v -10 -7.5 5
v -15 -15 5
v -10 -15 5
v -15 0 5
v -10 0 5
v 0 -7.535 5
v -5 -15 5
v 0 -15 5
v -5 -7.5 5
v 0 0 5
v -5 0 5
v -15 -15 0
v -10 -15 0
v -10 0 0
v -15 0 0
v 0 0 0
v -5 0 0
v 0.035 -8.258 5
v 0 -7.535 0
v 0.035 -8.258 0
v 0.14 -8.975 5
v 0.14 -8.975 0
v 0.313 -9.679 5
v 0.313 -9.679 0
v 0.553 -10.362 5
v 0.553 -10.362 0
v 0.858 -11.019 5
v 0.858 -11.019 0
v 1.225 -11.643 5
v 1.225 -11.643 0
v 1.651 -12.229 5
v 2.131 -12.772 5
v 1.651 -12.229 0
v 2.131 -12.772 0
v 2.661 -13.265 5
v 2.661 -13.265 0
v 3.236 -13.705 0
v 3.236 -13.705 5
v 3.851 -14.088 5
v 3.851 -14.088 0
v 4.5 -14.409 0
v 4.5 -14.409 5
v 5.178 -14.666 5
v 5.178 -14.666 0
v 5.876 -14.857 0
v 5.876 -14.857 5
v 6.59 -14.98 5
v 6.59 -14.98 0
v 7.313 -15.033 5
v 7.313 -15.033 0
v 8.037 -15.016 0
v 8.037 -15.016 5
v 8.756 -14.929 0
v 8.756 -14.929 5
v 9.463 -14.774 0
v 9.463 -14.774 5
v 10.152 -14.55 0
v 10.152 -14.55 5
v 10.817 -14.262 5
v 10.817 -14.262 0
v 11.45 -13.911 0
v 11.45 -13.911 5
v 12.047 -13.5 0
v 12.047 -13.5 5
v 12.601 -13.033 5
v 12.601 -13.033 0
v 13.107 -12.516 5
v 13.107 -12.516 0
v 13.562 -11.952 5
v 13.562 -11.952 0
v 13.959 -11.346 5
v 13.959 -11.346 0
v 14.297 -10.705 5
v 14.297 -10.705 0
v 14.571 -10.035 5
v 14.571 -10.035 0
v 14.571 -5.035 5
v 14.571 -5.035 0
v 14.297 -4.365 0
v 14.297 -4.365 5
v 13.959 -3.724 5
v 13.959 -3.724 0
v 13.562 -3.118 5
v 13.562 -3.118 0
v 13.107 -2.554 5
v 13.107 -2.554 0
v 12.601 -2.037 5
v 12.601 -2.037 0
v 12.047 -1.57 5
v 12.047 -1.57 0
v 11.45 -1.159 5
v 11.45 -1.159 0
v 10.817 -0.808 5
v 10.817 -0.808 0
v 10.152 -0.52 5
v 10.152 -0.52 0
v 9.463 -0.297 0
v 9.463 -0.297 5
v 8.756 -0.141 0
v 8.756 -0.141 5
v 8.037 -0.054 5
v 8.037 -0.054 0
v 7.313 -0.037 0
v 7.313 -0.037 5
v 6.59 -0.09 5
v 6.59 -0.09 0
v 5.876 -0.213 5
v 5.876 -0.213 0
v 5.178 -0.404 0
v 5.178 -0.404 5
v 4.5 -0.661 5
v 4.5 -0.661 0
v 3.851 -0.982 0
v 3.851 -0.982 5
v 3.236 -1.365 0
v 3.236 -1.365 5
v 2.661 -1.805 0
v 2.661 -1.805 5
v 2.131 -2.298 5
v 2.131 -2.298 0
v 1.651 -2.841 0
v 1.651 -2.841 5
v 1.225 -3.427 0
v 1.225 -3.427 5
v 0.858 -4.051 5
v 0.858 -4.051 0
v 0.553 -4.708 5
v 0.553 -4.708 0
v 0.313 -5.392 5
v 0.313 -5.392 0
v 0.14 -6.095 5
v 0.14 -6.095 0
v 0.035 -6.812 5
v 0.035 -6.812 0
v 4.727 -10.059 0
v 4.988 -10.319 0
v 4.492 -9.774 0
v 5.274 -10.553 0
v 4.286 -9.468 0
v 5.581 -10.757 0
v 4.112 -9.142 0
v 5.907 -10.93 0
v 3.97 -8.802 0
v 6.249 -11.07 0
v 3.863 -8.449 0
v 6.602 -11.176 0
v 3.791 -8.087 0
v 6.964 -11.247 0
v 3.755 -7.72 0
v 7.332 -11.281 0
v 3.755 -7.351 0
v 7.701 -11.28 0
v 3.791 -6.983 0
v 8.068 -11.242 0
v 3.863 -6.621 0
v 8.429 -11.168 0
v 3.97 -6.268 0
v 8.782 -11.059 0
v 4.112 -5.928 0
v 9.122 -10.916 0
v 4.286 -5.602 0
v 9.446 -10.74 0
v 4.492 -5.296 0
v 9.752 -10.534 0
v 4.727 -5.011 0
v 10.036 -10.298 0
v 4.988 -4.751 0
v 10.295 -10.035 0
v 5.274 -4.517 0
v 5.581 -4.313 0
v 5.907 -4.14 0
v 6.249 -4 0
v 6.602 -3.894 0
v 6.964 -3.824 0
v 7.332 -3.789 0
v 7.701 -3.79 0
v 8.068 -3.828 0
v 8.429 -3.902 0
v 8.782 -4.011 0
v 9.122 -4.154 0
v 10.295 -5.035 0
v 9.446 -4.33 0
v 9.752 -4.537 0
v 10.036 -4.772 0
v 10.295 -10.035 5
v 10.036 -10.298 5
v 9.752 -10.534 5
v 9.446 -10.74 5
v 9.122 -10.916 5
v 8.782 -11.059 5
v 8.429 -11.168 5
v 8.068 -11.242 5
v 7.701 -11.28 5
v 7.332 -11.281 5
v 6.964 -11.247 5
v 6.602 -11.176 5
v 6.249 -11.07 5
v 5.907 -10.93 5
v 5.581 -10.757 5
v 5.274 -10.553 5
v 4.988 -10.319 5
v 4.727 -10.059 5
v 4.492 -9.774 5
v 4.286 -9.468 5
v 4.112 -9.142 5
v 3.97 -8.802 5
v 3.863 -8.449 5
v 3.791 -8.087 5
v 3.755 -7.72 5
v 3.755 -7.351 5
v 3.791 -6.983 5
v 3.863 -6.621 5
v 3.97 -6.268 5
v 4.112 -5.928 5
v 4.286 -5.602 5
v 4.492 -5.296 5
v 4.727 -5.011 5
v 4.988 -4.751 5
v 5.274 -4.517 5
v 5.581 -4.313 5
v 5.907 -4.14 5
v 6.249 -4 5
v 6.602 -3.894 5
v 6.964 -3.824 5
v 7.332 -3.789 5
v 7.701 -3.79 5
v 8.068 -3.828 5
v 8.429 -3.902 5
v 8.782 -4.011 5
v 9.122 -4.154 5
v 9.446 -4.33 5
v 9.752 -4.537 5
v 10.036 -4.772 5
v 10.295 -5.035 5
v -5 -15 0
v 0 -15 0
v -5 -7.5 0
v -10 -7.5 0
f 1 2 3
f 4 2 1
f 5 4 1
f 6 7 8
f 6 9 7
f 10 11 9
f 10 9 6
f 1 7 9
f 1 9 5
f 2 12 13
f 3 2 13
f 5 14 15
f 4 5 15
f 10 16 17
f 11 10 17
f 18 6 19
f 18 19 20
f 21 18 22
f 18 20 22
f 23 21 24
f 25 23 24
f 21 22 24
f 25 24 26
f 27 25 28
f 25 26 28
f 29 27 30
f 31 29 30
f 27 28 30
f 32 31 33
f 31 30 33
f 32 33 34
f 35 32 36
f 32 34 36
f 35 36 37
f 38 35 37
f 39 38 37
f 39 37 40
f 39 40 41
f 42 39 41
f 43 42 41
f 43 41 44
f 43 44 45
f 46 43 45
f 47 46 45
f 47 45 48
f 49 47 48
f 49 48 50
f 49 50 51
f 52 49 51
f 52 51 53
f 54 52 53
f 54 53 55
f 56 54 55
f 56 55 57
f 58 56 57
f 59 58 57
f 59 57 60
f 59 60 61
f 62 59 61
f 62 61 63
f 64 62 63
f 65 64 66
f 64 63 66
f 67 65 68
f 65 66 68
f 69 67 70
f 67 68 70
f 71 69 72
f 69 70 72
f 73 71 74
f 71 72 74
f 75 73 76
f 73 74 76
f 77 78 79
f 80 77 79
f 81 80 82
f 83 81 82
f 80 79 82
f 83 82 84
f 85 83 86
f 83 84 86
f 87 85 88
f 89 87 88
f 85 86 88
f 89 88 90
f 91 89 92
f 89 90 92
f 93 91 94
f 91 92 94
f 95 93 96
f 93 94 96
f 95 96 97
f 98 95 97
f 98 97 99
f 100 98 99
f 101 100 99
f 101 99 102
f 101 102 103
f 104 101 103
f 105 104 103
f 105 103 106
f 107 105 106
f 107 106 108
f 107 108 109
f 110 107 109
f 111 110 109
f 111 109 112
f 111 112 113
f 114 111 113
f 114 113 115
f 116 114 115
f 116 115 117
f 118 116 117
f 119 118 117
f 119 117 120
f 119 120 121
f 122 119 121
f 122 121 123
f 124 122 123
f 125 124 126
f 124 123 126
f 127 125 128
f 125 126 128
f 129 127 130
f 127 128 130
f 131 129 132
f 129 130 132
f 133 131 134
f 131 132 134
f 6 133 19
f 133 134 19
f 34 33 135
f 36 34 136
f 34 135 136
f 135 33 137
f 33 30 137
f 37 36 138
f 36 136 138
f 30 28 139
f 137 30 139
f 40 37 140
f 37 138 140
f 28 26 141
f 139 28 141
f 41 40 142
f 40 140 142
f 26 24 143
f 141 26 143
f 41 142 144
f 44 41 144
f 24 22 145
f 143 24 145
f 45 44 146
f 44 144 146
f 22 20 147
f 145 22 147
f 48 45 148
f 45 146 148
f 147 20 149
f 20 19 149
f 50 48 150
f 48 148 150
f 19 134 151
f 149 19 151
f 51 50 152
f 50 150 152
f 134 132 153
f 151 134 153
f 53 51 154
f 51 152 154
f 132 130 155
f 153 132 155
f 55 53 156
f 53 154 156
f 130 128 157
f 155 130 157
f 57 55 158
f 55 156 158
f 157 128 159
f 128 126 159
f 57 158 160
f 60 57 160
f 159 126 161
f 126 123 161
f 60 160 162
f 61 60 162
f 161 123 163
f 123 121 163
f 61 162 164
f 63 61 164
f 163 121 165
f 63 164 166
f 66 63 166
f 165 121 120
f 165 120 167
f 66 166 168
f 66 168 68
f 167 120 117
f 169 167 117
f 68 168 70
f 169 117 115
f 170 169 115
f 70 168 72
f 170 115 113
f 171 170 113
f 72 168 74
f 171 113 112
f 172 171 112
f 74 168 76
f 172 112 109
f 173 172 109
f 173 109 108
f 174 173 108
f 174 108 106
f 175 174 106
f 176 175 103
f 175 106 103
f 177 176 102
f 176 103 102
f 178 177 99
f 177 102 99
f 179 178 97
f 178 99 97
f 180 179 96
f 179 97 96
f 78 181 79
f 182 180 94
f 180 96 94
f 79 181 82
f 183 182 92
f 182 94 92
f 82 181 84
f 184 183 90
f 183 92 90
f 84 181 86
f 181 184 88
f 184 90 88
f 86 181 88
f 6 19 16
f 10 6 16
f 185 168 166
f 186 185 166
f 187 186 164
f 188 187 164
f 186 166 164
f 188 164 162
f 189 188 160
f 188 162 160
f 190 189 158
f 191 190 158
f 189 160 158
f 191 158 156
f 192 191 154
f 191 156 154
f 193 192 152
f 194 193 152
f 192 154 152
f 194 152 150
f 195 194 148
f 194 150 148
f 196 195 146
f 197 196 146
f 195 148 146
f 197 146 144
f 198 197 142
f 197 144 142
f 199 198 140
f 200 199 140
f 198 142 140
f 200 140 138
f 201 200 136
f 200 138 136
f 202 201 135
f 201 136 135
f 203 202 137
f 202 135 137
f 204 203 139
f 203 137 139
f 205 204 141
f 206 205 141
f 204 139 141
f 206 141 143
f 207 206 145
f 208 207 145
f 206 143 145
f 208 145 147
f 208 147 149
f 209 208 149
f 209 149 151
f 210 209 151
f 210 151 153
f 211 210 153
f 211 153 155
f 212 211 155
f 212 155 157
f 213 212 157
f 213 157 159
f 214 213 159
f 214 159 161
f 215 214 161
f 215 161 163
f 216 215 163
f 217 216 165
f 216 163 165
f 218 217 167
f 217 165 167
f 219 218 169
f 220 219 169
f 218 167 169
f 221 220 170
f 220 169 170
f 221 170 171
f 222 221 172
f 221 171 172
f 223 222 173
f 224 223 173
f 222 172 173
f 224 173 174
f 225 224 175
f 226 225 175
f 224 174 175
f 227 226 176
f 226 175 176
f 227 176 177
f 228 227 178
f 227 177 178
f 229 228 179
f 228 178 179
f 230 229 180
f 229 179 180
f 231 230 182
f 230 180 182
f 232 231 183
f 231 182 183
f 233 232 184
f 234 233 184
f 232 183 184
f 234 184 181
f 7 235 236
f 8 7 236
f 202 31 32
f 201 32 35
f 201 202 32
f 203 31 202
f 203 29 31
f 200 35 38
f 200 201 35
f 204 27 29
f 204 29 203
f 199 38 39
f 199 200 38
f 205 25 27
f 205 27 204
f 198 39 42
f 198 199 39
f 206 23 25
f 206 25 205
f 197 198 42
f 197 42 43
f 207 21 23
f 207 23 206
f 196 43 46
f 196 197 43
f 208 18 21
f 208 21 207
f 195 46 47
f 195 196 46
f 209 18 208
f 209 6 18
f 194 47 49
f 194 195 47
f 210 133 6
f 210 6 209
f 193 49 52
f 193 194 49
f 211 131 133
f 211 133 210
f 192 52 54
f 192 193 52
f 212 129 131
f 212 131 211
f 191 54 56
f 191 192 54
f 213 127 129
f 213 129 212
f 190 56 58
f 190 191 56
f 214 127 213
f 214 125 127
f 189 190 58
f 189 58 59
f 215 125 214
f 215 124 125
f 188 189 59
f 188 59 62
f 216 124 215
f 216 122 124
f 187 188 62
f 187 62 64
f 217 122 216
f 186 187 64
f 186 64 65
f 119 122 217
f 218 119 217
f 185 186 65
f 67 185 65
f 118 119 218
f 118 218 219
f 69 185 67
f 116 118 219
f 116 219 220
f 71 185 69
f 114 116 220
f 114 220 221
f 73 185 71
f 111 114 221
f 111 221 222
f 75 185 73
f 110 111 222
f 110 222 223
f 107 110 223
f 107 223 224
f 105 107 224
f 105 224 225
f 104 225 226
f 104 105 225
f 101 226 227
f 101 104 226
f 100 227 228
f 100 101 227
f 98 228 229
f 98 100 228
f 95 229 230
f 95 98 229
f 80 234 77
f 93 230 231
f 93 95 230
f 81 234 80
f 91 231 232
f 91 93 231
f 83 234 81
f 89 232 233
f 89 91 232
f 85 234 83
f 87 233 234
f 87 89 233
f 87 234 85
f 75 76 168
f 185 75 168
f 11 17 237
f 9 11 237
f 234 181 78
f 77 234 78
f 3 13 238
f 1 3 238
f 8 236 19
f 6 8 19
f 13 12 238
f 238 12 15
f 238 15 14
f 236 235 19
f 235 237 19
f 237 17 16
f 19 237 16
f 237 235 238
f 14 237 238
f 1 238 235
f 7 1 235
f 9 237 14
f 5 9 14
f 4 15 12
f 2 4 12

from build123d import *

# Parameters (mm, degrees)
F1_DEPTH = 5
F3_DEPTH = 5


with BuildPart() as f1:
    # F0 (on Top) → F1 (new body)
    with BuildSketch(Plane.XY):
        Polygon((-15, 0), (-15, -15), (-10, -15), (-10, -7.5), (-5, -15), (0, -15), (0, 0), (-5, 0), (-5, -7.5), (-10, 0), align=None)
    extrude(amount=F1_DEPTH)

    # F2 (on Top) → F3 (join)
    with BuildSketch(Plane.XY):
        with BuildLine():
            Line((10.295085, -5.035033), (14.571068, -5.035033))
            ThreePointArc((14.571068, -5.035033), (0, -7.535033), (14.571068, -10.035033))
            Line((14.571068, -10.035033), (10.295085, -10.035033))
            ThreePointArc((10.295085, -10.035033), (3.75, -7.535033), (10.295085, -5.035033))
        make_face()
    extrude(amount=F3_DEPTH)


solid = f1.part
